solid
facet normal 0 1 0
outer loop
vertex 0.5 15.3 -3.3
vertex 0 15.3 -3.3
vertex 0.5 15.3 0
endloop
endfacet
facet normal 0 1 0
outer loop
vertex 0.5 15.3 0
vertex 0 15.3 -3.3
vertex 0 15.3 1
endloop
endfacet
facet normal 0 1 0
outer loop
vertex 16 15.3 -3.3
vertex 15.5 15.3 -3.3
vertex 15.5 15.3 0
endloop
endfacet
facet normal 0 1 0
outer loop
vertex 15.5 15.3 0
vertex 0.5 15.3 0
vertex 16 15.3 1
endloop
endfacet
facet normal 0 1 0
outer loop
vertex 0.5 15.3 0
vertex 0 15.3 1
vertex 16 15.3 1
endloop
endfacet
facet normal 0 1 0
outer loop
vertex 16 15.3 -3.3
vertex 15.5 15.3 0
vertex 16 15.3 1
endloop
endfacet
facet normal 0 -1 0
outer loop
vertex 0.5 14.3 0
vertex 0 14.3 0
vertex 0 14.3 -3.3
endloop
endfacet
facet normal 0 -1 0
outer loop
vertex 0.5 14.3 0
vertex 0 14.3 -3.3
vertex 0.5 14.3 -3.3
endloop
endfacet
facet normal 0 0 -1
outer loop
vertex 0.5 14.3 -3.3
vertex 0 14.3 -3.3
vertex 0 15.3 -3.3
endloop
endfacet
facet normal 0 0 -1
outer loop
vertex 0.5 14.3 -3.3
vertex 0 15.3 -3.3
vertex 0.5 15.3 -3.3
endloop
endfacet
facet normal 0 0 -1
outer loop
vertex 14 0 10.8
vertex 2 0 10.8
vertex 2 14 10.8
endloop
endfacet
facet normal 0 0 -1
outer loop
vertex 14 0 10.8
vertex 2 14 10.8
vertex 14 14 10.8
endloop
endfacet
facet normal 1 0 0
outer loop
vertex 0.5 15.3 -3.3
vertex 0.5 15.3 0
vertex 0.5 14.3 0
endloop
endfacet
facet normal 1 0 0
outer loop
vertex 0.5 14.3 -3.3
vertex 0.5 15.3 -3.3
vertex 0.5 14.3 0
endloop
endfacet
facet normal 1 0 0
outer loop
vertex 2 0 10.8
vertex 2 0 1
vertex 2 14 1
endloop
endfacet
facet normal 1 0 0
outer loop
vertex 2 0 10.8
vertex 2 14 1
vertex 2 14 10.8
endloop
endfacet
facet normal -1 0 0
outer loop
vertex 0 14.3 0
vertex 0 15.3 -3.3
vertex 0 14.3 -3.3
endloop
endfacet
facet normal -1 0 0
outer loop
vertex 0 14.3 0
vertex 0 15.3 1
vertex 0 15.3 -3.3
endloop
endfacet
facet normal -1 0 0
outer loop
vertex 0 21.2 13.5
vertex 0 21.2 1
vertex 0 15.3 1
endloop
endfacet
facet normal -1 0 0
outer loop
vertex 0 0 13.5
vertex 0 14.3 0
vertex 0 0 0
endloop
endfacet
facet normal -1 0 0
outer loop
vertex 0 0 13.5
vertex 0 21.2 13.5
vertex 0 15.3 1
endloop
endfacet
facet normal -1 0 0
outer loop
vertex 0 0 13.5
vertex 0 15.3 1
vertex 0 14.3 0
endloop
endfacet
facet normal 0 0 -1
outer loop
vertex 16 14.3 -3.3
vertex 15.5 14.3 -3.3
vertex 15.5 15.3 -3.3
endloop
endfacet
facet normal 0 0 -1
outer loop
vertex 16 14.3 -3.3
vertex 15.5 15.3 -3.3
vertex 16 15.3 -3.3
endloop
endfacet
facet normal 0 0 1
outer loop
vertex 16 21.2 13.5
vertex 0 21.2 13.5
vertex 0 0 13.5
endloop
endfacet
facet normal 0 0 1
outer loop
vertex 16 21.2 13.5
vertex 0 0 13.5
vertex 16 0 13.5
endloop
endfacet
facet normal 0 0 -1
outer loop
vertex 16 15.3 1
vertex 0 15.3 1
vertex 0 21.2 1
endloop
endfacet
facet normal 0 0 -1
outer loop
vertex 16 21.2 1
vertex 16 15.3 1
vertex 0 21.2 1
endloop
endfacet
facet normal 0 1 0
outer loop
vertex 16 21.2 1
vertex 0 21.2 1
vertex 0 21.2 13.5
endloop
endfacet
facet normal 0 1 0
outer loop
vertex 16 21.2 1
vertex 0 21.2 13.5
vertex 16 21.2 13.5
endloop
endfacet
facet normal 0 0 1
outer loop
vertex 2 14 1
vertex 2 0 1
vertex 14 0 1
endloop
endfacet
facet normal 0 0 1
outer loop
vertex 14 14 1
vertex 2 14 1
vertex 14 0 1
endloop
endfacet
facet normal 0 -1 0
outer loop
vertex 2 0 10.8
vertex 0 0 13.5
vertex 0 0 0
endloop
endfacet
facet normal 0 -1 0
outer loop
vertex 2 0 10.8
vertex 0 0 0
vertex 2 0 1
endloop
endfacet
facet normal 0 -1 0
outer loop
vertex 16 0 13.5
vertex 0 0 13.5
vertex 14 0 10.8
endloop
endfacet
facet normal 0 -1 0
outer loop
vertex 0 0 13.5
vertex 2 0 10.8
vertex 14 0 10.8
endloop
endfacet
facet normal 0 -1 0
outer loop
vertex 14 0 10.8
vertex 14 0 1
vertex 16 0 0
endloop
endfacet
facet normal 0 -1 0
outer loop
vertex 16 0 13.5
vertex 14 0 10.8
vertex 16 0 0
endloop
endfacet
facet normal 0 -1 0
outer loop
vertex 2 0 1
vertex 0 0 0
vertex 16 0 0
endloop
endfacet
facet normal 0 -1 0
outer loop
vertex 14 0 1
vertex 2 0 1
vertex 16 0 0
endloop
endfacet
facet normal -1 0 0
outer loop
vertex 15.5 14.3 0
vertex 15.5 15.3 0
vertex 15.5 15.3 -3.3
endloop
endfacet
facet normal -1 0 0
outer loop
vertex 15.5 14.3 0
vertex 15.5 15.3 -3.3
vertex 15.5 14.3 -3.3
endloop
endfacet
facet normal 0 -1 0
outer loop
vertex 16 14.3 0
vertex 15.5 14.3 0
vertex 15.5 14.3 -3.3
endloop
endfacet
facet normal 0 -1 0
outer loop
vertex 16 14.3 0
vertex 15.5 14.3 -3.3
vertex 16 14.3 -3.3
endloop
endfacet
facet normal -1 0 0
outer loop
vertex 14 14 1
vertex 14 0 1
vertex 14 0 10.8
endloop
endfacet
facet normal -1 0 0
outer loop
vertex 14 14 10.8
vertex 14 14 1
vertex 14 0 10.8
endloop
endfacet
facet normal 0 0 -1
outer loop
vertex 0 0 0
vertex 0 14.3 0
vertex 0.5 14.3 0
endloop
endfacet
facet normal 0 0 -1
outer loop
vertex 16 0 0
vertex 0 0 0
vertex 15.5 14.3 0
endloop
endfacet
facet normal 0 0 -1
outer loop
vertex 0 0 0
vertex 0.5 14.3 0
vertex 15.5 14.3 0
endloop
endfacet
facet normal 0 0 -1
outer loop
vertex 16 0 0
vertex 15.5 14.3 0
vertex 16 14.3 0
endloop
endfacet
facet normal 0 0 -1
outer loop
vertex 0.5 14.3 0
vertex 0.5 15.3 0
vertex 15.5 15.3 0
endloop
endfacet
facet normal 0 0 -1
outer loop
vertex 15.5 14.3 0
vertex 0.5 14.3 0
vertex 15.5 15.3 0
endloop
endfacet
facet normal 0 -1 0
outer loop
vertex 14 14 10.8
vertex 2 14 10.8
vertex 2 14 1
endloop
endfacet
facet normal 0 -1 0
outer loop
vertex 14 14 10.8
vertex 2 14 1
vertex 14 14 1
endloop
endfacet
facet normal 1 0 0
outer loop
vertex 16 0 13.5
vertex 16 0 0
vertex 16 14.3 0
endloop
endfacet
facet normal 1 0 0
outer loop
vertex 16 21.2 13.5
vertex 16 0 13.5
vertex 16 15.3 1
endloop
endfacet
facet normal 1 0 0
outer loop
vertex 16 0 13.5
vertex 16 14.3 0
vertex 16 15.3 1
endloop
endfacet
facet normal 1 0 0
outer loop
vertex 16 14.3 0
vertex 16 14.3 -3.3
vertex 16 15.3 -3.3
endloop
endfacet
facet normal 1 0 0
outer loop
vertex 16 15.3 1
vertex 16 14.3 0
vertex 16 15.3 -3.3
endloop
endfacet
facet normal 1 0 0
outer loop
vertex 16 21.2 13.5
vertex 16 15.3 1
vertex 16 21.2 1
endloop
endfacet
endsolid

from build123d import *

# Parameters (mm, degrees)
F0_W     = 16
F0_H     = 21.2
F1_DEPTH = 13.5
F2_W     = 5.9
F2_H     = 1
F3_DEPTH = 16
F4_W     = 12
F4_H     = 9.8
F5_DEPTH = 14
F6_W     = 0.5
F6_H     = 1
F7_DEPTH = 3.3


with BuildPart() as f1:
    # F0 (on Top) → F1 (new body)
    with BuildSketch(Plane.XY):
        with Locations((8, 10.6)):
            Rectangle(F0_W, F0_H)
    extrude(amount=F1_DEPTH)

    # F2 (on face) → F3 (cut, through all)
    with BuildSketch(Plane.YZ.offset(16)):
        with Locations((18.25, 0.5)):
            Rectangle(F2_W, F2_H)
    extrude(amount=-F3_DEPTH, mode=Mode.SUBTRACT)

    # F4 (on face) → F5 (cut)
    with BuildSketch(Plane.XZ):
        with Locations((8, 5.9)):
            Rectangle(F4_W, F4_H)
    extrude(amount=-F5_DEPTH, mode=Mode.SUBTRACT)

    # F6 (on face) → F7 (join)
    with BuildSketch(Plane(origin=(0, 0, 0), x_dir=(1, 0, 0), z_dir=(0, 0, -1))):
        with Locations((0.25, -14.8)):
            Rectangle(F6_W, F6_H)
        with Locations((15.75, -14.8)):
            Rectangle(F6_W, F6_H)
    extrude(amount=F7_DEPTH)


solid = f1.part
